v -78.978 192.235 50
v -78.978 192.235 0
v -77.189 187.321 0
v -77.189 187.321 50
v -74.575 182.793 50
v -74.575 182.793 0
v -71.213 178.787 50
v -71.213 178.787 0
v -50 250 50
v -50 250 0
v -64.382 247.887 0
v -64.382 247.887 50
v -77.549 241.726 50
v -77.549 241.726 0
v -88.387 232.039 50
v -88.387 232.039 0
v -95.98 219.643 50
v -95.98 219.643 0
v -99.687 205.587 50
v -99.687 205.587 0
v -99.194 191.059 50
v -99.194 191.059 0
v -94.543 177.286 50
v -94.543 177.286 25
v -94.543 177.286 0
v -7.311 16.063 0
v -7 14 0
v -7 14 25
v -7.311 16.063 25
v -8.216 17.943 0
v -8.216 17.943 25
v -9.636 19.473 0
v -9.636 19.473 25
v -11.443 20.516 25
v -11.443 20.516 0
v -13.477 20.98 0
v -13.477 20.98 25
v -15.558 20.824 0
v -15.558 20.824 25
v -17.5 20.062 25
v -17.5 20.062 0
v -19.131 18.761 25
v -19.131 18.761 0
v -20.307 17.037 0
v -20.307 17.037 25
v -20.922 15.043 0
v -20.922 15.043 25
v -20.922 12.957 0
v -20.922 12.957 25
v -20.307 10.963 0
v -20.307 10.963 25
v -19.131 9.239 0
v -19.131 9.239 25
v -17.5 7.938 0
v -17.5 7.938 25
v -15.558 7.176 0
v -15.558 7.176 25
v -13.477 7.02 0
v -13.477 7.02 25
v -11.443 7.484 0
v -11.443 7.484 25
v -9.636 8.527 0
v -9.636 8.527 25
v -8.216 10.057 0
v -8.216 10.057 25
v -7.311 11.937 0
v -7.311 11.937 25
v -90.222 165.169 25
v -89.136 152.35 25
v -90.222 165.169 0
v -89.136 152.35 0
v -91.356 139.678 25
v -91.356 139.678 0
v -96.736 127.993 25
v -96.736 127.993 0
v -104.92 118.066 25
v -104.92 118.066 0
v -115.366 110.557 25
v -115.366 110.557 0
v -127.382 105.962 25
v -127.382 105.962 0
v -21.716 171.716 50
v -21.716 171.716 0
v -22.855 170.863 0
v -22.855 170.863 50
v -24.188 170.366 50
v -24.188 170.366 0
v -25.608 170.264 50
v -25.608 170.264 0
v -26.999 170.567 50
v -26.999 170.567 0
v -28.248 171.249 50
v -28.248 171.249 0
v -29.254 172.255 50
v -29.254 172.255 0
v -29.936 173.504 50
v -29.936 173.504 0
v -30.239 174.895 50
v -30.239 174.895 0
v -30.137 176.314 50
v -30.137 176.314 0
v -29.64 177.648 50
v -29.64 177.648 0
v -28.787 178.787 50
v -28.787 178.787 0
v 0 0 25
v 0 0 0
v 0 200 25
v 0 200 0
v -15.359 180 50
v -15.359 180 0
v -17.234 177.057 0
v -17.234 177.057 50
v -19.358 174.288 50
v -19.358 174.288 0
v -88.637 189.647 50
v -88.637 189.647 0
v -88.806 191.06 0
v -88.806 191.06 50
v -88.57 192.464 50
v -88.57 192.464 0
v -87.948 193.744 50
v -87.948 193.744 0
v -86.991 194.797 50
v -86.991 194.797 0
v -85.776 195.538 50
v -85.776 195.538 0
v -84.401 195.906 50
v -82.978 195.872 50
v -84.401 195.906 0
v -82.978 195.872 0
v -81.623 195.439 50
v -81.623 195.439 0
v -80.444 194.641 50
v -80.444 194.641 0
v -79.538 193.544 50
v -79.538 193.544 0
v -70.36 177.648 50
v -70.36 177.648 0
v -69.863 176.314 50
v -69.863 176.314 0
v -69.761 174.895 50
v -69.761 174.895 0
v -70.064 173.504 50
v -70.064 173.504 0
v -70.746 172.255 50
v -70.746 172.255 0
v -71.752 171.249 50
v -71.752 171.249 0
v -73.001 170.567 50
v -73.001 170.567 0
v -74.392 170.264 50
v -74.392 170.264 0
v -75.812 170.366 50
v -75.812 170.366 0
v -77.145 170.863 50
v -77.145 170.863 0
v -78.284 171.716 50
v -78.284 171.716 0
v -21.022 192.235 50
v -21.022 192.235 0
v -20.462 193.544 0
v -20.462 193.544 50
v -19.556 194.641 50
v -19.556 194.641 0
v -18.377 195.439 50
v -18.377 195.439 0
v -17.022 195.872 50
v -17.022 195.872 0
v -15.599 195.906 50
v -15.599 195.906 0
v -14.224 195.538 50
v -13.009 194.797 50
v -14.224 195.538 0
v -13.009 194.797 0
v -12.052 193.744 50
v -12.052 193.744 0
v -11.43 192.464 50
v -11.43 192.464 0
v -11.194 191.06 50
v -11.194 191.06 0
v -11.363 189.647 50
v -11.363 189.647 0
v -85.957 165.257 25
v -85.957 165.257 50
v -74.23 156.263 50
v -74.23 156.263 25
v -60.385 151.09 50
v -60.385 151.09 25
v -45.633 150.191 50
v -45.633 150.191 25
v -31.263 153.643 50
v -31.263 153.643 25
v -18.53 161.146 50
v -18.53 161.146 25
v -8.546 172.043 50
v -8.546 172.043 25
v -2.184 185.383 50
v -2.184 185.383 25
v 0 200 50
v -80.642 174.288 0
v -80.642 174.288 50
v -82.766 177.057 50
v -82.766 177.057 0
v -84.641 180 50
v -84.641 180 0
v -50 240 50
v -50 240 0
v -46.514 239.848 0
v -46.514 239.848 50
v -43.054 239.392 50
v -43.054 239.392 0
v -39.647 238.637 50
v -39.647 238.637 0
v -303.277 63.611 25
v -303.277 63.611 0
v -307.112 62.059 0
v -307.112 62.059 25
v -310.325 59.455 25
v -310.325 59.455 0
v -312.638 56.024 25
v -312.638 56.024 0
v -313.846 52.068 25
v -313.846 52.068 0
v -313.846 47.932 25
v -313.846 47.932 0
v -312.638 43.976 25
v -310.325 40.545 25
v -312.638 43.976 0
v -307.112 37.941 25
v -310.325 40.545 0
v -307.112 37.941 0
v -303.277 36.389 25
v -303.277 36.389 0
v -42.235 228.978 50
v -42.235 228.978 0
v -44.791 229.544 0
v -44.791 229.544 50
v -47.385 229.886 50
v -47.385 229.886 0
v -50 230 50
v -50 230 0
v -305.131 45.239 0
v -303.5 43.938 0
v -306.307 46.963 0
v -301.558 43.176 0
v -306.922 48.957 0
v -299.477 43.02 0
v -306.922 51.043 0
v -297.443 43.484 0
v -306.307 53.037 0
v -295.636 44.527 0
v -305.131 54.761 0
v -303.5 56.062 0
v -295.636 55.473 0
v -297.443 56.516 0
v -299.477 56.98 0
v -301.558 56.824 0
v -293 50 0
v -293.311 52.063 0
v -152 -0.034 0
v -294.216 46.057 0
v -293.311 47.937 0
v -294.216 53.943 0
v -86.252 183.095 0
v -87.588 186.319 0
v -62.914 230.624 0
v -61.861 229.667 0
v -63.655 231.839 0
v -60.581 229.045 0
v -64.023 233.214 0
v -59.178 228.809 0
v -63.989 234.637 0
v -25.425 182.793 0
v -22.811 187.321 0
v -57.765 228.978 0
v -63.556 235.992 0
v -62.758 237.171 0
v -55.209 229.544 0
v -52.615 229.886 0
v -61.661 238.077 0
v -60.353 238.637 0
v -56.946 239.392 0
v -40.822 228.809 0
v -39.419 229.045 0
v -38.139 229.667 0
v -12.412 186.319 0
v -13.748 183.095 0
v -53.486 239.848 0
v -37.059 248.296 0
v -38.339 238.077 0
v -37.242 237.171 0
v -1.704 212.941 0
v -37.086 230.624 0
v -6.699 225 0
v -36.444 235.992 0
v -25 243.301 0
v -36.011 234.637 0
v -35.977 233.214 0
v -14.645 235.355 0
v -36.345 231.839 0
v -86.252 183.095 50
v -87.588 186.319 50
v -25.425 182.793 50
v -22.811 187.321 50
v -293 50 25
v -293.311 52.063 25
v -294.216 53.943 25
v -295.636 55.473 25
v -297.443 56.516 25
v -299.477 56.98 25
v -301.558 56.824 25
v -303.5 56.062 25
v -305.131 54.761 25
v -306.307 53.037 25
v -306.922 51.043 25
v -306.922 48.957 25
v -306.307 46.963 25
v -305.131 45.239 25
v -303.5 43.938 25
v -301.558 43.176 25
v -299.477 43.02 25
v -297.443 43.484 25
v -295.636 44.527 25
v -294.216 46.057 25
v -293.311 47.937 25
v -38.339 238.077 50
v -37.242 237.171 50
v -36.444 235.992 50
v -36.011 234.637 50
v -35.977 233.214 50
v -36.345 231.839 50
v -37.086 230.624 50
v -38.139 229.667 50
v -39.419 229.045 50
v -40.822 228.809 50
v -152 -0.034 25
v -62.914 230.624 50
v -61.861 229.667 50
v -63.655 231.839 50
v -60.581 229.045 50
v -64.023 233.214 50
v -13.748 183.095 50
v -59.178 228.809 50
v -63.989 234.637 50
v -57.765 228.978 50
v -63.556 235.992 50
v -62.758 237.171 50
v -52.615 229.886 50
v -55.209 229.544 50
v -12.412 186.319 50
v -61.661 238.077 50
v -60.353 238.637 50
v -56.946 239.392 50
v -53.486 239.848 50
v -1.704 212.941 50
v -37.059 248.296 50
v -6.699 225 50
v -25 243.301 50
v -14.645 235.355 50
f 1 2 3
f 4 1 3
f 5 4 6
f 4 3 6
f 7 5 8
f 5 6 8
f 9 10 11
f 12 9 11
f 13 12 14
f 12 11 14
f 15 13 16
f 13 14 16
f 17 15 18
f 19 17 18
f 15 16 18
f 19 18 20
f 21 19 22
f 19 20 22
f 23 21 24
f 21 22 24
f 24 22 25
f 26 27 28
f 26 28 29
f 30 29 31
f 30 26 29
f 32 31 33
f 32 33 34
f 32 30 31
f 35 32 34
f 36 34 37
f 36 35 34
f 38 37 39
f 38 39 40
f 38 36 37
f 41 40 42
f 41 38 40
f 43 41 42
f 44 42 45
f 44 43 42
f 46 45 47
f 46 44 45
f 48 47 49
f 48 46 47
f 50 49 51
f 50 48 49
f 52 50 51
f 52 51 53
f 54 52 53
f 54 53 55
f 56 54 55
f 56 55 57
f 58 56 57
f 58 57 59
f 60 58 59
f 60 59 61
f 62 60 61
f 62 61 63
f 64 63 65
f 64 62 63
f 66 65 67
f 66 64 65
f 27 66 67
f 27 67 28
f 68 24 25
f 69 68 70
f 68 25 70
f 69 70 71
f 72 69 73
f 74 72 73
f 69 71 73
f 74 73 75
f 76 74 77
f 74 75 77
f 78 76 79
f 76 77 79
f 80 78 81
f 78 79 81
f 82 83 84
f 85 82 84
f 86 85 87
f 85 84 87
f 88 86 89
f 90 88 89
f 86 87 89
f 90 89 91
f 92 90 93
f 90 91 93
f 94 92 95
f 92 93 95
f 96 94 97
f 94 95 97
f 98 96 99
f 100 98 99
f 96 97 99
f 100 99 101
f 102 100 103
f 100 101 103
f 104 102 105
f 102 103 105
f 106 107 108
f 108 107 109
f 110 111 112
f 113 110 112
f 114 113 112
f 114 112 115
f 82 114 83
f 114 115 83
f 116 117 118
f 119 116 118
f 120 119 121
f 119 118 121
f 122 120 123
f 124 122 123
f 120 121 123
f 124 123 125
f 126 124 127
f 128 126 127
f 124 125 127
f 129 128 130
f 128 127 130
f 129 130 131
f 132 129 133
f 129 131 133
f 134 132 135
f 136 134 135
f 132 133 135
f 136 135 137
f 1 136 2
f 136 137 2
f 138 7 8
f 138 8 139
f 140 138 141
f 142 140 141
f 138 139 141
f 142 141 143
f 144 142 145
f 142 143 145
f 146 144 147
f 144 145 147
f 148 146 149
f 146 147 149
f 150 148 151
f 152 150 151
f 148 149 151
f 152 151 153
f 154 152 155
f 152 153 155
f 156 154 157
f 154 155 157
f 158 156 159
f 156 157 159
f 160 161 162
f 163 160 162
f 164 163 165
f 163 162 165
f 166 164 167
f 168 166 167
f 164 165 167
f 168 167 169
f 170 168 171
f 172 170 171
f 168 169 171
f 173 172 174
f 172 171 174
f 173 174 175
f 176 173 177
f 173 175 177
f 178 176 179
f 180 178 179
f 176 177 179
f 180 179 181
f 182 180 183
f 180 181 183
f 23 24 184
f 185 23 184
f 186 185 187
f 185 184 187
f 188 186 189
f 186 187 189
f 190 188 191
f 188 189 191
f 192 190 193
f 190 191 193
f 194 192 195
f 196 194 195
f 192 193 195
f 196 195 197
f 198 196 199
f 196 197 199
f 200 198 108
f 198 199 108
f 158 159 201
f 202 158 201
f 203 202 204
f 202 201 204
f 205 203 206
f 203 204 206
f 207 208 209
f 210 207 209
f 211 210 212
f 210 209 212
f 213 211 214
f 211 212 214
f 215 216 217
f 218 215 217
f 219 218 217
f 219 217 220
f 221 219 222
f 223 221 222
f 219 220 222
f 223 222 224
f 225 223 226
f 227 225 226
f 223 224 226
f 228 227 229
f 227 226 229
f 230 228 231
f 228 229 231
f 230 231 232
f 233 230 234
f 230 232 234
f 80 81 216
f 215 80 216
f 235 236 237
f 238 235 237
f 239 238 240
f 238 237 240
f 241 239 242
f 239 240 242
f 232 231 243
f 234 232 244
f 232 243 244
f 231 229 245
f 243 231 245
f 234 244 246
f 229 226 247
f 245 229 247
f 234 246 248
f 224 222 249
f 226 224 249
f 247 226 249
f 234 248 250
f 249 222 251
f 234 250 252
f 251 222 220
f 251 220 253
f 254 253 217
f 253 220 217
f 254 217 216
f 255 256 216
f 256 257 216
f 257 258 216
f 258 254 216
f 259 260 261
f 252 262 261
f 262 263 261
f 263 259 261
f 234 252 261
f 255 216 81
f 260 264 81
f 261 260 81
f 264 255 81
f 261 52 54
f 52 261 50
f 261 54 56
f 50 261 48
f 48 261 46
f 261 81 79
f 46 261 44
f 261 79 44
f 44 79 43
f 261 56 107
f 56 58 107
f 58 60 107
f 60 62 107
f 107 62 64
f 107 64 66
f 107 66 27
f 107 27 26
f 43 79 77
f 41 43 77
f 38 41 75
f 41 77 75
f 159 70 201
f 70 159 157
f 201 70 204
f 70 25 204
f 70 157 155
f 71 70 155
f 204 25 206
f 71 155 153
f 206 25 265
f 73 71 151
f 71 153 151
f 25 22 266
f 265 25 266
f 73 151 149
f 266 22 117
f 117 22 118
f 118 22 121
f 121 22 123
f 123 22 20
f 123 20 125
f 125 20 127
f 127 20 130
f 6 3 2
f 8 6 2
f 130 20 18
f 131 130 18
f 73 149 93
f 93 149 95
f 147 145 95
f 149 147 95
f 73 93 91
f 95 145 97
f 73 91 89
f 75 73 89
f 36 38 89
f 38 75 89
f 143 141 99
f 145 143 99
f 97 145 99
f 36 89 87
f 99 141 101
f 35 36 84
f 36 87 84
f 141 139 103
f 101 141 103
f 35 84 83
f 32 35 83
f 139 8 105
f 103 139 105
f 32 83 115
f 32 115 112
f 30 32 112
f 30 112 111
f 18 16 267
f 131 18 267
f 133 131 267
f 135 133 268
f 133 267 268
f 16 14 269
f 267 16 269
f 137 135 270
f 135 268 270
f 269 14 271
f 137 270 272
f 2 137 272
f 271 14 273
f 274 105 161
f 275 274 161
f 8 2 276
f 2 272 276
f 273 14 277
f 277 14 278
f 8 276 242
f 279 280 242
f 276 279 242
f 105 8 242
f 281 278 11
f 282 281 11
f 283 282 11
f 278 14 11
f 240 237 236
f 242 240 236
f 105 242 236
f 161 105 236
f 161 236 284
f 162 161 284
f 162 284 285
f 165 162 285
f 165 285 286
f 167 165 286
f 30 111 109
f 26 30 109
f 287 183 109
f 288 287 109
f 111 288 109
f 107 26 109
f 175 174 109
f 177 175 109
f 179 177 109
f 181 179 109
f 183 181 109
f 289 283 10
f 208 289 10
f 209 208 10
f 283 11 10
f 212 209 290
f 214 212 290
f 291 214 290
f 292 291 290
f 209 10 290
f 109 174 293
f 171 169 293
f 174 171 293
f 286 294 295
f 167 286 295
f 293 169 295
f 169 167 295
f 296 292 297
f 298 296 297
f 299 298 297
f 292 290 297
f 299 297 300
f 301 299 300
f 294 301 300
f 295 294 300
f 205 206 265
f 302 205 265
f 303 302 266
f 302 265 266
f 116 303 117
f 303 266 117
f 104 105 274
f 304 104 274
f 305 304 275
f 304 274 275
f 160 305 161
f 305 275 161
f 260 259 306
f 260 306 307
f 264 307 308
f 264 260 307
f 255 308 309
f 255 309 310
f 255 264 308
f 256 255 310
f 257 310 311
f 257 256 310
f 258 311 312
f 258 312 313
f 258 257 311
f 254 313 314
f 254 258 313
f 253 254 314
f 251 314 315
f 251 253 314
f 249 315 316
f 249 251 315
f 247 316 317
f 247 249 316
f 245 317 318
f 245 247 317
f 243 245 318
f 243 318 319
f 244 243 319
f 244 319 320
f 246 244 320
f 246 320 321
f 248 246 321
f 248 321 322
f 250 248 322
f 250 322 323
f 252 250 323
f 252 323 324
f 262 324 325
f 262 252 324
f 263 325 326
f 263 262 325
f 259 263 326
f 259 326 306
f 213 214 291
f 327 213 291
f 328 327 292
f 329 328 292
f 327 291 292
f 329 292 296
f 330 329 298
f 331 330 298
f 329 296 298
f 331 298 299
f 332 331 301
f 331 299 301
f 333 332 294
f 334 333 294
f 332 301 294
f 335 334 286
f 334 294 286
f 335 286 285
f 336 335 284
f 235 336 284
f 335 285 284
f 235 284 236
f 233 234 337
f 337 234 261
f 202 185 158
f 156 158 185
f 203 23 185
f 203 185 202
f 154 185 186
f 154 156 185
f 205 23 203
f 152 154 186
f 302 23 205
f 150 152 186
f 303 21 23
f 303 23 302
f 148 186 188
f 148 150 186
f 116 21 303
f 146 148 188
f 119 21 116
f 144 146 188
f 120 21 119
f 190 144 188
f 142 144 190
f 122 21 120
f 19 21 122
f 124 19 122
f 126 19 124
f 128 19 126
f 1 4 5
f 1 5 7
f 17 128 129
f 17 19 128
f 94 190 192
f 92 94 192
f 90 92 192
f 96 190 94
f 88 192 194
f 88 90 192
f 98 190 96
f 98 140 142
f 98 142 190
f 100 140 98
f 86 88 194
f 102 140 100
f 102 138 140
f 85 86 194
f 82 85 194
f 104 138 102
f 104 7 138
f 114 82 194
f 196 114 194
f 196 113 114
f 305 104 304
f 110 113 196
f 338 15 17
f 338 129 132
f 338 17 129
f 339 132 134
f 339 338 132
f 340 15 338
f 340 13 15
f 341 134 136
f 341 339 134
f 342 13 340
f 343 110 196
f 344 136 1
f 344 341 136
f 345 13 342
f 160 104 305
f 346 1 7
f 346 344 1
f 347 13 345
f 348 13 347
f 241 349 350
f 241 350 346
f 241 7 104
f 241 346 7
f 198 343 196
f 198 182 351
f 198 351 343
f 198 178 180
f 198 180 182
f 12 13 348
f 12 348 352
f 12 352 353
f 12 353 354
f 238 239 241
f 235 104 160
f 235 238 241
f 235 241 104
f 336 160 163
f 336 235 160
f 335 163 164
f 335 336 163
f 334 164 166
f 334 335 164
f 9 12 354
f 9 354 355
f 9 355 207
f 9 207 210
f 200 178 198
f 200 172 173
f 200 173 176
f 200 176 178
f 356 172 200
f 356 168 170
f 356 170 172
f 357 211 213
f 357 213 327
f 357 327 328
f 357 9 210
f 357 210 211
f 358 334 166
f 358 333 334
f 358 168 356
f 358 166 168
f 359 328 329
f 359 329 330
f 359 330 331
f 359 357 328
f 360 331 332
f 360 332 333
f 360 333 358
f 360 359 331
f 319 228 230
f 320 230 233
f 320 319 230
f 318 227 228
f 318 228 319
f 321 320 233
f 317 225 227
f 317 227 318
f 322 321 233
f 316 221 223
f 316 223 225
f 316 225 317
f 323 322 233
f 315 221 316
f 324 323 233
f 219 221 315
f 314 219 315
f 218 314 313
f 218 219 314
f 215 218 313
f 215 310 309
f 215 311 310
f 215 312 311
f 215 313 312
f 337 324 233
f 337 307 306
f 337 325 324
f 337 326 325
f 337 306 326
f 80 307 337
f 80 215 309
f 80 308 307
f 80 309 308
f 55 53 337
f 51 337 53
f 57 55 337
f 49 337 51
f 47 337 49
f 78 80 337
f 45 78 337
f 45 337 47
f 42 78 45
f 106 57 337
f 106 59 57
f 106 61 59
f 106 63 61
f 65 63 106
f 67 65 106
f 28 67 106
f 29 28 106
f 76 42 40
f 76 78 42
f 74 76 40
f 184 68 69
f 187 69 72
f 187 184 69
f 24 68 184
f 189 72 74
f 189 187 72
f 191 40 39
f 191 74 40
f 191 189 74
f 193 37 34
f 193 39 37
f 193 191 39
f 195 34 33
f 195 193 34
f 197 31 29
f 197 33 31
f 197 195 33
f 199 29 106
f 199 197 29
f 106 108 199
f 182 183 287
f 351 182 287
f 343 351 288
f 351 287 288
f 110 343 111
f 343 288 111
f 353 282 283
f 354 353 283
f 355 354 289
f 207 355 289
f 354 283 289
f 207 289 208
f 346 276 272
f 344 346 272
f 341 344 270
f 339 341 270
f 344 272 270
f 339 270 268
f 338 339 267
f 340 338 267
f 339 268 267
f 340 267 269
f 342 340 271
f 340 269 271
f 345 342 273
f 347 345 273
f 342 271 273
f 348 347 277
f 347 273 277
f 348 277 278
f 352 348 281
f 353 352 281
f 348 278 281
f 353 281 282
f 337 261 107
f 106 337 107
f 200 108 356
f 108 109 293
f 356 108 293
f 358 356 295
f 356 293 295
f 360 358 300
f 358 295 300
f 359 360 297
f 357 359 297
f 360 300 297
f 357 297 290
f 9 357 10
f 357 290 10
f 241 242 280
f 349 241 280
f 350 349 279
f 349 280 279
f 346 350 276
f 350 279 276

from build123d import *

# Parameters (mm, degrees)
F0_R     = 7
F1_DEPTH = 25
F2_DEPTH = 50


with BuildPart() as f1:
    # F0 (on Top) → F1 (new body)
    with BuildSketch(Plane.XY):
        with BuildLine():
            Line((-151.999996, -0.034339), (0, 0))
            Line((0, 0), (0, 200))
            ThreePointArc((0, 200), (-38.319968, 151.383369), (-94.543074, 177.286247))
            ThreePointArc((-94.543074, 177.286247), (-93.668792, 133.66164), (-127.382019, 105.961658))
            Line((-127.382019, 105.961658), (-303.277156, 63.611034))
            ThreePointArc((-303.277156, 63.611034), (-291.336288, 60.997277), (-286, 50))
            ThreePointArc((-286, 50), (-291.336288, 39.002723), (-303.277156, 36.388966))
            Line((-303.277156, 36.388966), (-151.999996, -0.034339))
        make_face()
        with Locations((-14, 14)):
            Circle(F0_R, mode=Mode.SUBTRACT)
        with BuildLine():
            ThreePointArc((-303.277156, 63.611034), (-314, 50), (-303.277156, 36.388966))
            ThreePointArc((-303.277156, 36.388966), (-291.336288, 39.002723), (-286, 50))
            ThreePointArc((-286, 50), (-291.336288, 60.997277), (-303.277156, 63.611034))
        make_face()
        with Locations((-300, 50)):
            Circle(F0_R, mode=Mode.SUBTRACT)
    extrude(amount=F1_DEPTH)

    # F0 (on Top) → F2 (join)
    with BuildSketch(Plane.XY):
        with BuildLine():
            ThreePointArc((-94.543074, 177.286247), (-38.319968, 151.383369), (0, 200))
            ThreePointArc((0, 200), (-14.644661, 235.355339), (-50, 250))
            ThreePointArc((-50, 250), (-92.63618, 226.11812), (-94.543074, 177.286247))
        make_face()
        with BuildLine():
            ThreePointArc((-84.641016, 180), (-86.955181, 184.692663), (-88.637033, 189.647238))
            ThreePointArc((-88.637033, 189.647238), (-85.101499, 195.770963), (-78.977775, 192.235429))
            ThreePointArc((-78.977775, 192.235429), (-75.980762, 185), (-71.213203, 178.786797))
            ThreePointArc((-71.213203, 178.786797), (-71.213203, 171.715729), (-78.284271, 171.715729))
            ThreePointArc((-78.284271, 171.715729), (-81.734134, 175.649543), (-84.641016, 180))
        make_face(mode=Mode.SUBTRACT)
        with BuildLine():
            ThreePointArc((-15.358984, 180), (-18.265866, 175.649543), (-21.715729, 171.715729))
            ThreePointArc((-21.715729, 171.715729), (-28.786797, 171.715729), (-28.786797, 178.786797))
            ThreePointArc((-28.786797, 178.786797), (-24.019238, 185), (-21.022225, 192.235429))
            ThreePointArc((-21.022225, 192.235429), (-14.898501, 195.770963), (-11.362967, 189.647238))
            ThreePointArc((-11.362967, 189.647238), (-13.044819, 184.692663), (-15.358984, 180))
        make_face(mode=Mode.SUBTRACT)
        with BuildLine():
            ThreePointArc((-60.352762, 238.637033), (-55.221048, 239.657794), (-50, 240))
            ThreePointArc((-50, 240), (-44.778952, 239.657794), (-39.647238, 238.637033))
            ThreePointArc((-39.647238, 238.637033), (-36.111704, 232.513309), (-42.235429, 228.977775))
            ThreePointArc((-42.235429, 228.977775), (-46.084214, 229.743346), (-50, 230))
            ThreePointArc((-50, 230), (-53.915786, 229.743346), (-57.764571, 228.977775))
            ThreePointArc((-57.764571, 228.977775), (-63.888296, 232.513309), (-60.352762, 238.637033))
        make_face(mode=Mode.SUBTRACT)
    extrude(amount=F2_DEPTH)


solid = f1.part
